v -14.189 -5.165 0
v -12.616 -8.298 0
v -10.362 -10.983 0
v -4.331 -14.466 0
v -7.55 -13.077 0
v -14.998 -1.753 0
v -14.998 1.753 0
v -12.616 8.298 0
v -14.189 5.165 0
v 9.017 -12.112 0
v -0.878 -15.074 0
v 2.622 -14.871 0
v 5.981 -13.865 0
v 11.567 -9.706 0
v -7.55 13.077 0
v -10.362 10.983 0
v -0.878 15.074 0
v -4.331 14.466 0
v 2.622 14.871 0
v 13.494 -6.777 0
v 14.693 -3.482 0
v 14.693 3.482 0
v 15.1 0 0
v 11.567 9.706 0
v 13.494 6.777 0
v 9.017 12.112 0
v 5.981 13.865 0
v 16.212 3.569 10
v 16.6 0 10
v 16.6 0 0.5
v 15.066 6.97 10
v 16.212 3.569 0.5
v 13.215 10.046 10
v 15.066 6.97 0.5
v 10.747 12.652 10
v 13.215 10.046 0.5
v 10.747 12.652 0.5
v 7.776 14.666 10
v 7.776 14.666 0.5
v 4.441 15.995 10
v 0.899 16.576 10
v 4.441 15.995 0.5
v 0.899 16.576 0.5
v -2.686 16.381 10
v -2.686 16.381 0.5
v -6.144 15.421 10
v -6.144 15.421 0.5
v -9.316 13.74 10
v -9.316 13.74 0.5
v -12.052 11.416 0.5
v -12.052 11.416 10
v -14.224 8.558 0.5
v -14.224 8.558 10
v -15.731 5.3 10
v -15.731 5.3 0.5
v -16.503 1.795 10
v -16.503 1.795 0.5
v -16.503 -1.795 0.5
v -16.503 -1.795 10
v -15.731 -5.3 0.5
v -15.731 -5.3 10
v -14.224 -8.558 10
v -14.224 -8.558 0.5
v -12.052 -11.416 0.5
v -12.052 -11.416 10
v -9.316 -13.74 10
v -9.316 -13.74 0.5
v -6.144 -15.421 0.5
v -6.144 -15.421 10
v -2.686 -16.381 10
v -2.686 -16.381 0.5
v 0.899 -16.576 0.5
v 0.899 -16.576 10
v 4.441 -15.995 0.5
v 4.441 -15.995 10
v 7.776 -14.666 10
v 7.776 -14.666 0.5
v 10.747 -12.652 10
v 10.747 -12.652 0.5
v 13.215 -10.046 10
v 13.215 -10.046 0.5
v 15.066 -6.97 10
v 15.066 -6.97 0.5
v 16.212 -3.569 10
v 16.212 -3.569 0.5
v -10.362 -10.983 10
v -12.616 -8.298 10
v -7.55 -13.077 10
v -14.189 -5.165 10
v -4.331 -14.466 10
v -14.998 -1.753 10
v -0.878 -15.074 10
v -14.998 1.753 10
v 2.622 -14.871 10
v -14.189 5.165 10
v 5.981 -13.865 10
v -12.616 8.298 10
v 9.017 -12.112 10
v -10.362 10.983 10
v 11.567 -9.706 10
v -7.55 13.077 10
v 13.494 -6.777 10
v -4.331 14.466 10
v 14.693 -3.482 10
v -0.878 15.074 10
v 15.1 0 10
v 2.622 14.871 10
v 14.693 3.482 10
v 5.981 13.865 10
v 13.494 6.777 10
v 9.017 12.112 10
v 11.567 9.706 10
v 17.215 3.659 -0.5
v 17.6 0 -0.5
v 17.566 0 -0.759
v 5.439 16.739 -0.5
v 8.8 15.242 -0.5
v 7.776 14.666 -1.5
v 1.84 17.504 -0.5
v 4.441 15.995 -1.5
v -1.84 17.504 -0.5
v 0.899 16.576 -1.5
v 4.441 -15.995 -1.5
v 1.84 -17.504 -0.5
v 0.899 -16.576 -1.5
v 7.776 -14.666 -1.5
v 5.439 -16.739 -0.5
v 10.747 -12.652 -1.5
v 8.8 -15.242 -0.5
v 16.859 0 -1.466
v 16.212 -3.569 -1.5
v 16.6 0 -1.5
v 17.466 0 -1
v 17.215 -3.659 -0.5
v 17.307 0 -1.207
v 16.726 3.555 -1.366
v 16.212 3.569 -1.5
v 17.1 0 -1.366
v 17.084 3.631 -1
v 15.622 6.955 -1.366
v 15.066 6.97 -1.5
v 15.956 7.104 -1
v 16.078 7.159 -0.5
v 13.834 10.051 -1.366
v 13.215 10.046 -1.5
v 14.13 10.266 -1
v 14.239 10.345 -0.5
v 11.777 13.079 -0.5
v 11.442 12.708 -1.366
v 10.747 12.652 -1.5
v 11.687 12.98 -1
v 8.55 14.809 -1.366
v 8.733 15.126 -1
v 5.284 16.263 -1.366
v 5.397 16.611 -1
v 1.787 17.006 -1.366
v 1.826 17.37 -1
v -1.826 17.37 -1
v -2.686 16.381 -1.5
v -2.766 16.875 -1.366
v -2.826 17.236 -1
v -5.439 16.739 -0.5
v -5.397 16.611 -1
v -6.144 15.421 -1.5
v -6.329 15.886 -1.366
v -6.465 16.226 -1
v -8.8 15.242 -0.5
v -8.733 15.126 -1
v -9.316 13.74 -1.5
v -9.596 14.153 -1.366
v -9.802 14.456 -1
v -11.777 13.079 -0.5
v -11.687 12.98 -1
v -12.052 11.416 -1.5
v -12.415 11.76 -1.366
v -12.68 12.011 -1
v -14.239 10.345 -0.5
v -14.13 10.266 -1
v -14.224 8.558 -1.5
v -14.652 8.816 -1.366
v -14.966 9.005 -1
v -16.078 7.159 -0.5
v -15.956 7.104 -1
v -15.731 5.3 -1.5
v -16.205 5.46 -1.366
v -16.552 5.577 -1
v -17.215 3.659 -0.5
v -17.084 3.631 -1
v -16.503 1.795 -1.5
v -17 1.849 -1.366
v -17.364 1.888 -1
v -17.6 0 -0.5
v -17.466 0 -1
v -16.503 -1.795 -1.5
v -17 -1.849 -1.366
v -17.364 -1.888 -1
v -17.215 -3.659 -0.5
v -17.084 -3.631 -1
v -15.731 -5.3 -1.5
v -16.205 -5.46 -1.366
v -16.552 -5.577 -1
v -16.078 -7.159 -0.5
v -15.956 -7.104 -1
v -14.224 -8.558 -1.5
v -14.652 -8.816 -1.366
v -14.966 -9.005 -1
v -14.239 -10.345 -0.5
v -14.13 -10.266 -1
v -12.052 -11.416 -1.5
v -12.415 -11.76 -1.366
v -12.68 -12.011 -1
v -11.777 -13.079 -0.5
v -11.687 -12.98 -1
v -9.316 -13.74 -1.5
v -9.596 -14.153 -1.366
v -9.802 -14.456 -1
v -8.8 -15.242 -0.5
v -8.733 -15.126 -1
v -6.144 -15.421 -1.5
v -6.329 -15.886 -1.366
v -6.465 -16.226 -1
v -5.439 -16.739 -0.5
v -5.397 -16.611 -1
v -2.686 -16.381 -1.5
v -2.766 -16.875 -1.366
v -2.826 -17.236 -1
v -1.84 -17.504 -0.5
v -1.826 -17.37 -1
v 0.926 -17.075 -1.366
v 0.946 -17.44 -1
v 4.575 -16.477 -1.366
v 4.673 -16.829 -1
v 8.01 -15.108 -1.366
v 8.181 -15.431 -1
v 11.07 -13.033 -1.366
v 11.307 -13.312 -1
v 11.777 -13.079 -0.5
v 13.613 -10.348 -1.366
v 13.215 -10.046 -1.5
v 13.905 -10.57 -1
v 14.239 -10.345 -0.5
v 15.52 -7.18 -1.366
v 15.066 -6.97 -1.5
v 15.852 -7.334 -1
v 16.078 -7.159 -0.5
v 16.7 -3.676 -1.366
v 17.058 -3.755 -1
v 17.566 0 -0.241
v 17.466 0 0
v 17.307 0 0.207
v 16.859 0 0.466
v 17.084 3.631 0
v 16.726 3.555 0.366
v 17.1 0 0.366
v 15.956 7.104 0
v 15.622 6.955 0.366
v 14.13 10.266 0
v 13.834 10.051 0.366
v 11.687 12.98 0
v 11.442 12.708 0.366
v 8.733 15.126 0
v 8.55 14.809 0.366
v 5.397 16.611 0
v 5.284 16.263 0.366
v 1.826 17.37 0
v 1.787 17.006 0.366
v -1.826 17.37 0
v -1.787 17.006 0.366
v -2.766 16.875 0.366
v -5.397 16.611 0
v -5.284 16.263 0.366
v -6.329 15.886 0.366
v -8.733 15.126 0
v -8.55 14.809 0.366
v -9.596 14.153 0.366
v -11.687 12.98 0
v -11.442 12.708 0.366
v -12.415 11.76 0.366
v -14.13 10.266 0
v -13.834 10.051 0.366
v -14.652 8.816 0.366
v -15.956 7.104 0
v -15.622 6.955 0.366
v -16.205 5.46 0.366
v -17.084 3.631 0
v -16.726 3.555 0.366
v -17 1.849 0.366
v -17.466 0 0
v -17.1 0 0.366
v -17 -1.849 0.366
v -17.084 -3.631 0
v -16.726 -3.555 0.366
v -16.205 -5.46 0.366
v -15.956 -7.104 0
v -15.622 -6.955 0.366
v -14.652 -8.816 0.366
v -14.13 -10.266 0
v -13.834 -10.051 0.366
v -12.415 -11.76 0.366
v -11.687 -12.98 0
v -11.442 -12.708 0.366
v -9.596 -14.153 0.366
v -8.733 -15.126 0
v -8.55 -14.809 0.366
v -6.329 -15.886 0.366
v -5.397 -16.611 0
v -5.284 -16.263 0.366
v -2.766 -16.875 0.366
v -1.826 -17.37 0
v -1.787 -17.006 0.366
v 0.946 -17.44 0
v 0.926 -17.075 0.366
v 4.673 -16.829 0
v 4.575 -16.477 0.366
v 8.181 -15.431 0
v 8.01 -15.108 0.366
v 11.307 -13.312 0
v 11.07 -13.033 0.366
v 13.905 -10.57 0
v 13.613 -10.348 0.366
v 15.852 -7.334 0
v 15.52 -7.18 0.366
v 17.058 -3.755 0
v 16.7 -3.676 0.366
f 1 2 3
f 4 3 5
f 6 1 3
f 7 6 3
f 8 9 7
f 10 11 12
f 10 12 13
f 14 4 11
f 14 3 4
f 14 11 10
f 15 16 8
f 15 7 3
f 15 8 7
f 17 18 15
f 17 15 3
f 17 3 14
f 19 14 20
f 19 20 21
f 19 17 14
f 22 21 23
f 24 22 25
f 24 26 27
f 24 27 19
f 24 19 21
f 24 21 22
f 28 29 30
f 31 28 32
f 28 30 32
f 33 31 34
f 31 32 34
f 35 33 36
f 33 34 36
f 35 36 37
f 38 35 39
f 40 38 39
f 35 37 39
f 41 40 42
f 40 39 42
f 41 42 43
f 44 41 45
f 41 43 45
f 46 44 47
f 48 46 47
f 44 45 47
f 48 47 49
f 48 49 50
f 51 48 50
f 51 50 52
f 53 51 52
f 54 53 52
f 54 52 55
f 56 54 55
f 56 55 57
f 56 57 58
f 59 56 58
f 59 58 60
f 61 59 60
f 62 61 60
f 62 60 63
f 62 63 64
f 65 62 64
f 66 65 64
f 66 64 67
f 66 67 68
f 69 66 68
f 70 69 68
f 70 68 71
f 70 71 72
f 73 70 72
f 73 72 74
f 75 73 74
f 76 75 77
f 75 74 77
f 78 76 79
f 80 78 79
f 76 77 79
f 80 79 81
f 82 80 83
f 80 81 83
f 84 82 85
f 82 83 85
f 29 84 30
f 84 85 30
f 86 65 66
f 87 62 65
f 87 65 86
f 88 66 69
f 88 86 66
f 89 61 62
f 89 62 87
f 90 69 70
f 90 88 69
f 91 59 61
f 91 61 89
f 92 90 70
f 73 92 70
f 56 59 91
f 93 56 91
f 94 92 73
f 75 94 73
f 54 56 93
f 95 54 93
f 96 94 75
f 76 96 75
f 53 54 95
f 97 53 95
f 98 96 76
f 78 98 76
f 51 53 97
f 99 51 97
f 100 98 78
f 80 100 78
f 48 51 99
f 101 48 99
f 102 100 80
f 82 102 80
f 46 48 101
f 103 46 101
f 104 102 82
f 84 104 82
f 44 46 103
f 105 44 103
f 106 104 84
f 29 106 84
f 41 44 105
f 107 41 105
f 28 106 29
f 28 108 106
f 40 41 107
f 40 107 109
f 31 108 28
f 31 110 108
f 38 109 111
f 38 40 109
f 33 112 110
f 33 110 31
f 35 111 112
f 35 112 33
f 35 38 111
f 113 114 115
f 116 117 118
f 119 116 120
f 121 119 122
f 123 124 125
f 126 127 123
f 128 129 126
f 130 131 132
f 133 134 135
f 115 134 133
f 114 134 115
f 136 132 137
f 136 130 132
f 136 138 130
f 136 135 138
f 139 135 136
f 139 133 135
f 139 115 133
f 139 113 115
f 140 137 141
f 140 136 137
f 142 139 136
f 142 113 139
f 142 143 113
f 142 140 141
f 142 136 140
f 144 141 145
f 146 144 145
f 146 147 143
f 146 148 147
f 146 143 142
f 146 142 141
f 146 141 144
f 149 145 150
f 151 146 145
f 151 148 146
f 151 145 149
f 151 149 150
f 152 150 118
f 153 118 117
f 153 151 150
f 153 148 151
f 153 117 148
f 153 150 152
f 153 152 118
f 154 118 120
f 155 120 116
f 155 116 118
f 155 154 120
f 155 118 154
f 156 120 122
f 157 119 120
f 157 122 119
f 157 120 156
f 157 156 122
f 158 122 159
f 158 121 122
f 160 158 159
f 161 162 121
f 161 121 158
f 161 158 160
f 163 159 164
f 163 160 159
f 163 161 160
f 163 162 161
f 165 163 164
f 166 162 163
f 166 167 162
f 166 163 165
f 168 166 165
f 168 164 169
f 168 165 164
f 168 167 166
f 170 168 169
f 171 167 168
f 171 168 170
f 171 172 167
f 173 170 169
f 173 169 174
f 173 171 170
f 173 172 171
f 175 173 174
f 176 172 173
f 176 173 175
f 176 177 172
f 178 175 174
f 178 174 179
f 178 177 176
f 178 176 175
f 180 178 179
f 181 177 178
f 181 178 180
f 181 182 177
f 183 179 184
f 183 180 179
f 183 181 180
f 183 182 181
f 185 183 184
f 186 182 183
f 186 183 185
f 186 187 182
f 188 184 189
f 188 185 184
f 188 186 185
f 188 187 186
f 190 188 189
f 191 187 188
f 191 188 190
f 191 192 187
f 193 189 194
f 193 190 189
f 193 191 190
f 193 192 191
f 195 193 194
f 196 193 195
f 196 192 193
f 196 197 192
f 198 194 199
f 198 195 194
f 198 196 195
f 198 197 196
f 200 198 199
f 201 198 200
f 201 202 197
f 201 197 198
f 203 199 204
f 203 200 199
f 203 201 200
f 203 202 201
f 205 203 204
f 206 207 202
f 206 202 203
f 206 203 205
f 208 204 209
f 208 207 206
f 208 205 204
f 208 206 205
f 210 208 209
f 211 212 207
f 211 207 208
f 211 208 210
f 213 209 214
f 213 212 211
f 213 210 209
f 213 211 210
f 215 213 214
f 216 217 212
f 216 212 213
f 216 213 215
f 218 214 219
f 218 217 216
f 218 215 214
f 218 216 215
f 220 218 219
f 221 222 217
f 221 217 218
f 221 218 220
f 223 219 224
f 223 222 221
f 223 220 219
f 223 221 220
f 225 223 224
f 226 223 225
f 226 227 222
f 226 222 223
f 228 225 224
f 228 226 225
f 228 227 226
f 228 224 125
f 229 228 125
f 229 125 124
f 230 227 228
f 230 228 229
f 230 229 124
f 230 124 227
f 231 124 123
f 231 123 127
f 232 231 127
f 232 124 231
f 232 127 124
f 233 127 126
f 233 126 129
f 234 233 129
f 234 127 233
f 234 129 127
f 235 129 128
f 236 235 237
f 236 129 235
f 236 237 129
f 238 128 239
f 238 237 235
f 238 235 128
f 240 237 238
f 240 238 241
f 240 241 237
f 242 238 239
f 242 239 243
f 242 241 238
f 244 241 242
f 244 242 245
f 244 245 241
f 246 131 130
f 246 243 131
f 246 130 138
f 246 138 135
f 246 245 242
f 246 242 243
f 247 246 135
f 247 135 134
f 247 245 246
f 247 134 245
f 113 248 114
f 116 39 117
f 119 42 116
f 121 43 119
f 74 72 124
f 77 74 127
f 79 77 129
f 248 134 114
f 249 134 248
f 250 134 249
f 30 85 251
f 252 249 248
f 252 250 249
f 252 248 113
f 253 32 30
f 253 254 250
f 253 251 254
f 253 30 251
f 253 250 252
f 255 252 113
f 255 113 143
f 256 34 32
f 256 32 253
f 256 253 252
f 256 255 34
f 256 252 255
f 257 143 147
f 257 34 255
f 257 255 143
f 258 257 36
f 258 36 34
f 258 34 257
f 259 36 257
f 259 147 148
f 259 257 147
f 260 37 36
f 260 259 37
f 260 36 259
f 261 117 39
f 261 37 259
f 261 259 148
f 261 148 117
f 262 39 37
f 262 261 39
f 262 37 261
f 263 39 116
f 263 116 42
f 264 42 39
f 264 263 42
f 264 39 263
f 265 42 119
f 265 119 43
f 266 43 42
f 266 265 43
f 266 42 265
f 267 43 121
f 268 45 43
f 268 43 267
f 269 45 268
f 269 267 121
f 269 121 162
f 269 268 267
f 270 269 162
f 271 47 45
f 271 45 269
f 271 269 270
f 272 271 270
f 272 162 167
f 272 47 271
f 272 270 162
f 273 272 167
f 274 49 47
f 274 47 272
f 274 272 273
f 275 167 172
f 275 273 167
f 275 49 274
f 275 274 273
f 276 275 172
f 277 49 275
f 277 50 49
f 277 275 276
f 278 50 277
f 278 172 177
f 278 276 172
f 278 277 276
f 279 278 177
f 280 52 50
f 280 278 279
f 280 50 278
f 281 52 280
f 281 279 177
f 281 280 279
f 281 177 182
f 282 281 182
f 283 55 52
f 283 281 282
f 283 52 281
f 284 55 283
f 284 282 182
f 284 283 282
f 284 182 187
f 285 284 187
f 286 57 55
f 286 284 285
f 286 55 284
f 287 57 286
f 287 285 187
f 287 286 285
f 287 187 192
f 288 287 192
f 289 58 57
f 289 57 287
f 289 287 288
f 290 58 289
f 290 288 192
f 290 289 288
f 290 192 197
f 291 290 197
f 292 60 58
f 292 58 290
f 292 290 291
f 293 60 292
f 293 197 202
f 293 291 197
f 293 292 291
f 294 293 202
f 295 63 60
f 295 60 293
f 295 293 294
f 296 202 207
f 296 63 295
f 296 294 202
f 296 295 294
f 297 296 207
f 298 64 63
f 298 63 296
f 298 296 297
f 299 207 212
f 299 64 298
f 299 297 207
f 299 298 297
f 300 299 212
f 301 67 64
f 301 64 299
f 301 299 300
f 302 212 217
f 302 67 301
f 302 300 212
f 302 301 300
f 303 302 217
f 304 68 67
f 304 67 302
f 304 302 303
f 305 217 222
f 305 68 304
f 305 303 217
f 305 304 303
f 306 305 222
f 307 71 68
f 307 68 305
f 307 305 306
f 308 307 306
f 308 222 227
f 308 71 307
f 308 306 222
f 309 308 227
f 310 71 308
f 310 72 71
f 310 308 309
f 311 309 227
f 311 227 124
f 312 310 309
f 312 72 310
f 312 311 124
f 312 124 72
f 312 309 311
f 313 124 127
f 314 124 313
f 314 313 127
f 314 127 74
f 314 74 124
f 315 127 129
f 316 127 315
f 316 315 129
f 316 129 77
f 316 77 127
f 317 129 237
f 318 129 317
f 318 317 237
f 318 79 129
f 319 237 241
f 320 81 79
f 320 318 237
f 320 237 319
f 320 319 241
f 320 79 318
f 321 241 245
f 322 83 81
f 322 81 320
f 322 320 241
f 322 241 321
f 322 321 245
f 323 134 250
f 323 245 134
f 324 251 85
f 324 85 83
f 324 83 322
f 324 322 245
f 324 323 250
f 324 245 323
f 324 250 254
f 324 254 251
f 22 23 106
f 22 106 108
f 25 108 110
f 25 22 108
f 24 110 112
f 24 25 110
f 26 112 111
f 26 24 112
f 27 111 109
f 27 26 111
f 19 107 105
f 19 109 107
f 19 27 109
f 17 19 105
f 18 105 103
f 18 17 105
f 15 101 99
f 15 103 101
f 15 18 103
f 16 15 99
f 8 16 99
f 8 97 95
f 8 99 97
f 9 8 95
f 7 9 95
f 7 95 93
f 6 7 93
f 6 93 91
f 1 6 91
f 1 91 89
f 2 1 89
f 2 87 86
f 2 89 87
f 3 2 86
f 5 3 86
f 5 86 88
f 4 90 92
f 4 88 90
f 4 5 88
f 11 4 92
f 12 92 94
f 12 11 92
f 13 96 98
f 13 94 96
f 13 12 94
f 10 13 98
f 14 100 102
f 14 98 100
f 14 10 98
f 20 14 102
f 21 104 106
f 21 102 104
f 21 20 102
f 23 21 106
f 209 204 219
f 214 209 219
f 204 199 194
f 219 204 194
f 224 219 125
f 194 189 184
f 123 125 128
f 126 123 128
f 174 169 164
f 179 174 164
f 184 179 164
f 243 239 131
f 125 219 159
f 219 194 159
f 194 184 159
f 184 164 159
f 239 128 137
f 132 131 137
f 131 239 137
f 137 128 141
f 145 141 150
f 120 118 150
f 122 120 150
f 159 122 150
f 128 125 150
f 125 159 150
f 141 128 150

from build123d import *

# Parameters (mm, degrees)
TORUS_R           = 1
CYLINDER_R        = 15.1
CYLINDER_DEPTH    = 12.5
CYLINDER001_R     = 16.6
CYLINDER001_DEPTH = 11.5


with BuildPart() as lip:
    # Torus → Torus (revolve)
    with BuildSketch(Plane(origin=(0, 0, -0.5), x_dir=(1, 0, 0), z_dir=(0, -1, 0))):
        with Locations((16.6, 0)):
            Circle(TORUS_R)
    revolve(axis=Axis((0, 0, -0.5), (0, 0, 1)))


with BuildPart() as internal:
    # Cylinder → Cylinder (new body)
    with BuildSketch(Plane.XY):
        Circle(CYLINDER_R)
    extrude(amount=CYLINDER_DEPTH)


with BuildPart() as fusion:
    # Cylinder001 → Cylinder001 (new body)
    with BuildSketch(Plane.XY.offset(-1.5)):
        Circle(CYLINDER001_R)
    extrude(amount=CYLINDER001_DEPTH)

    # Cut: cut Internal
    add(internal.part, mode=Mode.SUBTRACT)

    # Fusion: union Lip
    add(lip.part)


solid = fusion.part
